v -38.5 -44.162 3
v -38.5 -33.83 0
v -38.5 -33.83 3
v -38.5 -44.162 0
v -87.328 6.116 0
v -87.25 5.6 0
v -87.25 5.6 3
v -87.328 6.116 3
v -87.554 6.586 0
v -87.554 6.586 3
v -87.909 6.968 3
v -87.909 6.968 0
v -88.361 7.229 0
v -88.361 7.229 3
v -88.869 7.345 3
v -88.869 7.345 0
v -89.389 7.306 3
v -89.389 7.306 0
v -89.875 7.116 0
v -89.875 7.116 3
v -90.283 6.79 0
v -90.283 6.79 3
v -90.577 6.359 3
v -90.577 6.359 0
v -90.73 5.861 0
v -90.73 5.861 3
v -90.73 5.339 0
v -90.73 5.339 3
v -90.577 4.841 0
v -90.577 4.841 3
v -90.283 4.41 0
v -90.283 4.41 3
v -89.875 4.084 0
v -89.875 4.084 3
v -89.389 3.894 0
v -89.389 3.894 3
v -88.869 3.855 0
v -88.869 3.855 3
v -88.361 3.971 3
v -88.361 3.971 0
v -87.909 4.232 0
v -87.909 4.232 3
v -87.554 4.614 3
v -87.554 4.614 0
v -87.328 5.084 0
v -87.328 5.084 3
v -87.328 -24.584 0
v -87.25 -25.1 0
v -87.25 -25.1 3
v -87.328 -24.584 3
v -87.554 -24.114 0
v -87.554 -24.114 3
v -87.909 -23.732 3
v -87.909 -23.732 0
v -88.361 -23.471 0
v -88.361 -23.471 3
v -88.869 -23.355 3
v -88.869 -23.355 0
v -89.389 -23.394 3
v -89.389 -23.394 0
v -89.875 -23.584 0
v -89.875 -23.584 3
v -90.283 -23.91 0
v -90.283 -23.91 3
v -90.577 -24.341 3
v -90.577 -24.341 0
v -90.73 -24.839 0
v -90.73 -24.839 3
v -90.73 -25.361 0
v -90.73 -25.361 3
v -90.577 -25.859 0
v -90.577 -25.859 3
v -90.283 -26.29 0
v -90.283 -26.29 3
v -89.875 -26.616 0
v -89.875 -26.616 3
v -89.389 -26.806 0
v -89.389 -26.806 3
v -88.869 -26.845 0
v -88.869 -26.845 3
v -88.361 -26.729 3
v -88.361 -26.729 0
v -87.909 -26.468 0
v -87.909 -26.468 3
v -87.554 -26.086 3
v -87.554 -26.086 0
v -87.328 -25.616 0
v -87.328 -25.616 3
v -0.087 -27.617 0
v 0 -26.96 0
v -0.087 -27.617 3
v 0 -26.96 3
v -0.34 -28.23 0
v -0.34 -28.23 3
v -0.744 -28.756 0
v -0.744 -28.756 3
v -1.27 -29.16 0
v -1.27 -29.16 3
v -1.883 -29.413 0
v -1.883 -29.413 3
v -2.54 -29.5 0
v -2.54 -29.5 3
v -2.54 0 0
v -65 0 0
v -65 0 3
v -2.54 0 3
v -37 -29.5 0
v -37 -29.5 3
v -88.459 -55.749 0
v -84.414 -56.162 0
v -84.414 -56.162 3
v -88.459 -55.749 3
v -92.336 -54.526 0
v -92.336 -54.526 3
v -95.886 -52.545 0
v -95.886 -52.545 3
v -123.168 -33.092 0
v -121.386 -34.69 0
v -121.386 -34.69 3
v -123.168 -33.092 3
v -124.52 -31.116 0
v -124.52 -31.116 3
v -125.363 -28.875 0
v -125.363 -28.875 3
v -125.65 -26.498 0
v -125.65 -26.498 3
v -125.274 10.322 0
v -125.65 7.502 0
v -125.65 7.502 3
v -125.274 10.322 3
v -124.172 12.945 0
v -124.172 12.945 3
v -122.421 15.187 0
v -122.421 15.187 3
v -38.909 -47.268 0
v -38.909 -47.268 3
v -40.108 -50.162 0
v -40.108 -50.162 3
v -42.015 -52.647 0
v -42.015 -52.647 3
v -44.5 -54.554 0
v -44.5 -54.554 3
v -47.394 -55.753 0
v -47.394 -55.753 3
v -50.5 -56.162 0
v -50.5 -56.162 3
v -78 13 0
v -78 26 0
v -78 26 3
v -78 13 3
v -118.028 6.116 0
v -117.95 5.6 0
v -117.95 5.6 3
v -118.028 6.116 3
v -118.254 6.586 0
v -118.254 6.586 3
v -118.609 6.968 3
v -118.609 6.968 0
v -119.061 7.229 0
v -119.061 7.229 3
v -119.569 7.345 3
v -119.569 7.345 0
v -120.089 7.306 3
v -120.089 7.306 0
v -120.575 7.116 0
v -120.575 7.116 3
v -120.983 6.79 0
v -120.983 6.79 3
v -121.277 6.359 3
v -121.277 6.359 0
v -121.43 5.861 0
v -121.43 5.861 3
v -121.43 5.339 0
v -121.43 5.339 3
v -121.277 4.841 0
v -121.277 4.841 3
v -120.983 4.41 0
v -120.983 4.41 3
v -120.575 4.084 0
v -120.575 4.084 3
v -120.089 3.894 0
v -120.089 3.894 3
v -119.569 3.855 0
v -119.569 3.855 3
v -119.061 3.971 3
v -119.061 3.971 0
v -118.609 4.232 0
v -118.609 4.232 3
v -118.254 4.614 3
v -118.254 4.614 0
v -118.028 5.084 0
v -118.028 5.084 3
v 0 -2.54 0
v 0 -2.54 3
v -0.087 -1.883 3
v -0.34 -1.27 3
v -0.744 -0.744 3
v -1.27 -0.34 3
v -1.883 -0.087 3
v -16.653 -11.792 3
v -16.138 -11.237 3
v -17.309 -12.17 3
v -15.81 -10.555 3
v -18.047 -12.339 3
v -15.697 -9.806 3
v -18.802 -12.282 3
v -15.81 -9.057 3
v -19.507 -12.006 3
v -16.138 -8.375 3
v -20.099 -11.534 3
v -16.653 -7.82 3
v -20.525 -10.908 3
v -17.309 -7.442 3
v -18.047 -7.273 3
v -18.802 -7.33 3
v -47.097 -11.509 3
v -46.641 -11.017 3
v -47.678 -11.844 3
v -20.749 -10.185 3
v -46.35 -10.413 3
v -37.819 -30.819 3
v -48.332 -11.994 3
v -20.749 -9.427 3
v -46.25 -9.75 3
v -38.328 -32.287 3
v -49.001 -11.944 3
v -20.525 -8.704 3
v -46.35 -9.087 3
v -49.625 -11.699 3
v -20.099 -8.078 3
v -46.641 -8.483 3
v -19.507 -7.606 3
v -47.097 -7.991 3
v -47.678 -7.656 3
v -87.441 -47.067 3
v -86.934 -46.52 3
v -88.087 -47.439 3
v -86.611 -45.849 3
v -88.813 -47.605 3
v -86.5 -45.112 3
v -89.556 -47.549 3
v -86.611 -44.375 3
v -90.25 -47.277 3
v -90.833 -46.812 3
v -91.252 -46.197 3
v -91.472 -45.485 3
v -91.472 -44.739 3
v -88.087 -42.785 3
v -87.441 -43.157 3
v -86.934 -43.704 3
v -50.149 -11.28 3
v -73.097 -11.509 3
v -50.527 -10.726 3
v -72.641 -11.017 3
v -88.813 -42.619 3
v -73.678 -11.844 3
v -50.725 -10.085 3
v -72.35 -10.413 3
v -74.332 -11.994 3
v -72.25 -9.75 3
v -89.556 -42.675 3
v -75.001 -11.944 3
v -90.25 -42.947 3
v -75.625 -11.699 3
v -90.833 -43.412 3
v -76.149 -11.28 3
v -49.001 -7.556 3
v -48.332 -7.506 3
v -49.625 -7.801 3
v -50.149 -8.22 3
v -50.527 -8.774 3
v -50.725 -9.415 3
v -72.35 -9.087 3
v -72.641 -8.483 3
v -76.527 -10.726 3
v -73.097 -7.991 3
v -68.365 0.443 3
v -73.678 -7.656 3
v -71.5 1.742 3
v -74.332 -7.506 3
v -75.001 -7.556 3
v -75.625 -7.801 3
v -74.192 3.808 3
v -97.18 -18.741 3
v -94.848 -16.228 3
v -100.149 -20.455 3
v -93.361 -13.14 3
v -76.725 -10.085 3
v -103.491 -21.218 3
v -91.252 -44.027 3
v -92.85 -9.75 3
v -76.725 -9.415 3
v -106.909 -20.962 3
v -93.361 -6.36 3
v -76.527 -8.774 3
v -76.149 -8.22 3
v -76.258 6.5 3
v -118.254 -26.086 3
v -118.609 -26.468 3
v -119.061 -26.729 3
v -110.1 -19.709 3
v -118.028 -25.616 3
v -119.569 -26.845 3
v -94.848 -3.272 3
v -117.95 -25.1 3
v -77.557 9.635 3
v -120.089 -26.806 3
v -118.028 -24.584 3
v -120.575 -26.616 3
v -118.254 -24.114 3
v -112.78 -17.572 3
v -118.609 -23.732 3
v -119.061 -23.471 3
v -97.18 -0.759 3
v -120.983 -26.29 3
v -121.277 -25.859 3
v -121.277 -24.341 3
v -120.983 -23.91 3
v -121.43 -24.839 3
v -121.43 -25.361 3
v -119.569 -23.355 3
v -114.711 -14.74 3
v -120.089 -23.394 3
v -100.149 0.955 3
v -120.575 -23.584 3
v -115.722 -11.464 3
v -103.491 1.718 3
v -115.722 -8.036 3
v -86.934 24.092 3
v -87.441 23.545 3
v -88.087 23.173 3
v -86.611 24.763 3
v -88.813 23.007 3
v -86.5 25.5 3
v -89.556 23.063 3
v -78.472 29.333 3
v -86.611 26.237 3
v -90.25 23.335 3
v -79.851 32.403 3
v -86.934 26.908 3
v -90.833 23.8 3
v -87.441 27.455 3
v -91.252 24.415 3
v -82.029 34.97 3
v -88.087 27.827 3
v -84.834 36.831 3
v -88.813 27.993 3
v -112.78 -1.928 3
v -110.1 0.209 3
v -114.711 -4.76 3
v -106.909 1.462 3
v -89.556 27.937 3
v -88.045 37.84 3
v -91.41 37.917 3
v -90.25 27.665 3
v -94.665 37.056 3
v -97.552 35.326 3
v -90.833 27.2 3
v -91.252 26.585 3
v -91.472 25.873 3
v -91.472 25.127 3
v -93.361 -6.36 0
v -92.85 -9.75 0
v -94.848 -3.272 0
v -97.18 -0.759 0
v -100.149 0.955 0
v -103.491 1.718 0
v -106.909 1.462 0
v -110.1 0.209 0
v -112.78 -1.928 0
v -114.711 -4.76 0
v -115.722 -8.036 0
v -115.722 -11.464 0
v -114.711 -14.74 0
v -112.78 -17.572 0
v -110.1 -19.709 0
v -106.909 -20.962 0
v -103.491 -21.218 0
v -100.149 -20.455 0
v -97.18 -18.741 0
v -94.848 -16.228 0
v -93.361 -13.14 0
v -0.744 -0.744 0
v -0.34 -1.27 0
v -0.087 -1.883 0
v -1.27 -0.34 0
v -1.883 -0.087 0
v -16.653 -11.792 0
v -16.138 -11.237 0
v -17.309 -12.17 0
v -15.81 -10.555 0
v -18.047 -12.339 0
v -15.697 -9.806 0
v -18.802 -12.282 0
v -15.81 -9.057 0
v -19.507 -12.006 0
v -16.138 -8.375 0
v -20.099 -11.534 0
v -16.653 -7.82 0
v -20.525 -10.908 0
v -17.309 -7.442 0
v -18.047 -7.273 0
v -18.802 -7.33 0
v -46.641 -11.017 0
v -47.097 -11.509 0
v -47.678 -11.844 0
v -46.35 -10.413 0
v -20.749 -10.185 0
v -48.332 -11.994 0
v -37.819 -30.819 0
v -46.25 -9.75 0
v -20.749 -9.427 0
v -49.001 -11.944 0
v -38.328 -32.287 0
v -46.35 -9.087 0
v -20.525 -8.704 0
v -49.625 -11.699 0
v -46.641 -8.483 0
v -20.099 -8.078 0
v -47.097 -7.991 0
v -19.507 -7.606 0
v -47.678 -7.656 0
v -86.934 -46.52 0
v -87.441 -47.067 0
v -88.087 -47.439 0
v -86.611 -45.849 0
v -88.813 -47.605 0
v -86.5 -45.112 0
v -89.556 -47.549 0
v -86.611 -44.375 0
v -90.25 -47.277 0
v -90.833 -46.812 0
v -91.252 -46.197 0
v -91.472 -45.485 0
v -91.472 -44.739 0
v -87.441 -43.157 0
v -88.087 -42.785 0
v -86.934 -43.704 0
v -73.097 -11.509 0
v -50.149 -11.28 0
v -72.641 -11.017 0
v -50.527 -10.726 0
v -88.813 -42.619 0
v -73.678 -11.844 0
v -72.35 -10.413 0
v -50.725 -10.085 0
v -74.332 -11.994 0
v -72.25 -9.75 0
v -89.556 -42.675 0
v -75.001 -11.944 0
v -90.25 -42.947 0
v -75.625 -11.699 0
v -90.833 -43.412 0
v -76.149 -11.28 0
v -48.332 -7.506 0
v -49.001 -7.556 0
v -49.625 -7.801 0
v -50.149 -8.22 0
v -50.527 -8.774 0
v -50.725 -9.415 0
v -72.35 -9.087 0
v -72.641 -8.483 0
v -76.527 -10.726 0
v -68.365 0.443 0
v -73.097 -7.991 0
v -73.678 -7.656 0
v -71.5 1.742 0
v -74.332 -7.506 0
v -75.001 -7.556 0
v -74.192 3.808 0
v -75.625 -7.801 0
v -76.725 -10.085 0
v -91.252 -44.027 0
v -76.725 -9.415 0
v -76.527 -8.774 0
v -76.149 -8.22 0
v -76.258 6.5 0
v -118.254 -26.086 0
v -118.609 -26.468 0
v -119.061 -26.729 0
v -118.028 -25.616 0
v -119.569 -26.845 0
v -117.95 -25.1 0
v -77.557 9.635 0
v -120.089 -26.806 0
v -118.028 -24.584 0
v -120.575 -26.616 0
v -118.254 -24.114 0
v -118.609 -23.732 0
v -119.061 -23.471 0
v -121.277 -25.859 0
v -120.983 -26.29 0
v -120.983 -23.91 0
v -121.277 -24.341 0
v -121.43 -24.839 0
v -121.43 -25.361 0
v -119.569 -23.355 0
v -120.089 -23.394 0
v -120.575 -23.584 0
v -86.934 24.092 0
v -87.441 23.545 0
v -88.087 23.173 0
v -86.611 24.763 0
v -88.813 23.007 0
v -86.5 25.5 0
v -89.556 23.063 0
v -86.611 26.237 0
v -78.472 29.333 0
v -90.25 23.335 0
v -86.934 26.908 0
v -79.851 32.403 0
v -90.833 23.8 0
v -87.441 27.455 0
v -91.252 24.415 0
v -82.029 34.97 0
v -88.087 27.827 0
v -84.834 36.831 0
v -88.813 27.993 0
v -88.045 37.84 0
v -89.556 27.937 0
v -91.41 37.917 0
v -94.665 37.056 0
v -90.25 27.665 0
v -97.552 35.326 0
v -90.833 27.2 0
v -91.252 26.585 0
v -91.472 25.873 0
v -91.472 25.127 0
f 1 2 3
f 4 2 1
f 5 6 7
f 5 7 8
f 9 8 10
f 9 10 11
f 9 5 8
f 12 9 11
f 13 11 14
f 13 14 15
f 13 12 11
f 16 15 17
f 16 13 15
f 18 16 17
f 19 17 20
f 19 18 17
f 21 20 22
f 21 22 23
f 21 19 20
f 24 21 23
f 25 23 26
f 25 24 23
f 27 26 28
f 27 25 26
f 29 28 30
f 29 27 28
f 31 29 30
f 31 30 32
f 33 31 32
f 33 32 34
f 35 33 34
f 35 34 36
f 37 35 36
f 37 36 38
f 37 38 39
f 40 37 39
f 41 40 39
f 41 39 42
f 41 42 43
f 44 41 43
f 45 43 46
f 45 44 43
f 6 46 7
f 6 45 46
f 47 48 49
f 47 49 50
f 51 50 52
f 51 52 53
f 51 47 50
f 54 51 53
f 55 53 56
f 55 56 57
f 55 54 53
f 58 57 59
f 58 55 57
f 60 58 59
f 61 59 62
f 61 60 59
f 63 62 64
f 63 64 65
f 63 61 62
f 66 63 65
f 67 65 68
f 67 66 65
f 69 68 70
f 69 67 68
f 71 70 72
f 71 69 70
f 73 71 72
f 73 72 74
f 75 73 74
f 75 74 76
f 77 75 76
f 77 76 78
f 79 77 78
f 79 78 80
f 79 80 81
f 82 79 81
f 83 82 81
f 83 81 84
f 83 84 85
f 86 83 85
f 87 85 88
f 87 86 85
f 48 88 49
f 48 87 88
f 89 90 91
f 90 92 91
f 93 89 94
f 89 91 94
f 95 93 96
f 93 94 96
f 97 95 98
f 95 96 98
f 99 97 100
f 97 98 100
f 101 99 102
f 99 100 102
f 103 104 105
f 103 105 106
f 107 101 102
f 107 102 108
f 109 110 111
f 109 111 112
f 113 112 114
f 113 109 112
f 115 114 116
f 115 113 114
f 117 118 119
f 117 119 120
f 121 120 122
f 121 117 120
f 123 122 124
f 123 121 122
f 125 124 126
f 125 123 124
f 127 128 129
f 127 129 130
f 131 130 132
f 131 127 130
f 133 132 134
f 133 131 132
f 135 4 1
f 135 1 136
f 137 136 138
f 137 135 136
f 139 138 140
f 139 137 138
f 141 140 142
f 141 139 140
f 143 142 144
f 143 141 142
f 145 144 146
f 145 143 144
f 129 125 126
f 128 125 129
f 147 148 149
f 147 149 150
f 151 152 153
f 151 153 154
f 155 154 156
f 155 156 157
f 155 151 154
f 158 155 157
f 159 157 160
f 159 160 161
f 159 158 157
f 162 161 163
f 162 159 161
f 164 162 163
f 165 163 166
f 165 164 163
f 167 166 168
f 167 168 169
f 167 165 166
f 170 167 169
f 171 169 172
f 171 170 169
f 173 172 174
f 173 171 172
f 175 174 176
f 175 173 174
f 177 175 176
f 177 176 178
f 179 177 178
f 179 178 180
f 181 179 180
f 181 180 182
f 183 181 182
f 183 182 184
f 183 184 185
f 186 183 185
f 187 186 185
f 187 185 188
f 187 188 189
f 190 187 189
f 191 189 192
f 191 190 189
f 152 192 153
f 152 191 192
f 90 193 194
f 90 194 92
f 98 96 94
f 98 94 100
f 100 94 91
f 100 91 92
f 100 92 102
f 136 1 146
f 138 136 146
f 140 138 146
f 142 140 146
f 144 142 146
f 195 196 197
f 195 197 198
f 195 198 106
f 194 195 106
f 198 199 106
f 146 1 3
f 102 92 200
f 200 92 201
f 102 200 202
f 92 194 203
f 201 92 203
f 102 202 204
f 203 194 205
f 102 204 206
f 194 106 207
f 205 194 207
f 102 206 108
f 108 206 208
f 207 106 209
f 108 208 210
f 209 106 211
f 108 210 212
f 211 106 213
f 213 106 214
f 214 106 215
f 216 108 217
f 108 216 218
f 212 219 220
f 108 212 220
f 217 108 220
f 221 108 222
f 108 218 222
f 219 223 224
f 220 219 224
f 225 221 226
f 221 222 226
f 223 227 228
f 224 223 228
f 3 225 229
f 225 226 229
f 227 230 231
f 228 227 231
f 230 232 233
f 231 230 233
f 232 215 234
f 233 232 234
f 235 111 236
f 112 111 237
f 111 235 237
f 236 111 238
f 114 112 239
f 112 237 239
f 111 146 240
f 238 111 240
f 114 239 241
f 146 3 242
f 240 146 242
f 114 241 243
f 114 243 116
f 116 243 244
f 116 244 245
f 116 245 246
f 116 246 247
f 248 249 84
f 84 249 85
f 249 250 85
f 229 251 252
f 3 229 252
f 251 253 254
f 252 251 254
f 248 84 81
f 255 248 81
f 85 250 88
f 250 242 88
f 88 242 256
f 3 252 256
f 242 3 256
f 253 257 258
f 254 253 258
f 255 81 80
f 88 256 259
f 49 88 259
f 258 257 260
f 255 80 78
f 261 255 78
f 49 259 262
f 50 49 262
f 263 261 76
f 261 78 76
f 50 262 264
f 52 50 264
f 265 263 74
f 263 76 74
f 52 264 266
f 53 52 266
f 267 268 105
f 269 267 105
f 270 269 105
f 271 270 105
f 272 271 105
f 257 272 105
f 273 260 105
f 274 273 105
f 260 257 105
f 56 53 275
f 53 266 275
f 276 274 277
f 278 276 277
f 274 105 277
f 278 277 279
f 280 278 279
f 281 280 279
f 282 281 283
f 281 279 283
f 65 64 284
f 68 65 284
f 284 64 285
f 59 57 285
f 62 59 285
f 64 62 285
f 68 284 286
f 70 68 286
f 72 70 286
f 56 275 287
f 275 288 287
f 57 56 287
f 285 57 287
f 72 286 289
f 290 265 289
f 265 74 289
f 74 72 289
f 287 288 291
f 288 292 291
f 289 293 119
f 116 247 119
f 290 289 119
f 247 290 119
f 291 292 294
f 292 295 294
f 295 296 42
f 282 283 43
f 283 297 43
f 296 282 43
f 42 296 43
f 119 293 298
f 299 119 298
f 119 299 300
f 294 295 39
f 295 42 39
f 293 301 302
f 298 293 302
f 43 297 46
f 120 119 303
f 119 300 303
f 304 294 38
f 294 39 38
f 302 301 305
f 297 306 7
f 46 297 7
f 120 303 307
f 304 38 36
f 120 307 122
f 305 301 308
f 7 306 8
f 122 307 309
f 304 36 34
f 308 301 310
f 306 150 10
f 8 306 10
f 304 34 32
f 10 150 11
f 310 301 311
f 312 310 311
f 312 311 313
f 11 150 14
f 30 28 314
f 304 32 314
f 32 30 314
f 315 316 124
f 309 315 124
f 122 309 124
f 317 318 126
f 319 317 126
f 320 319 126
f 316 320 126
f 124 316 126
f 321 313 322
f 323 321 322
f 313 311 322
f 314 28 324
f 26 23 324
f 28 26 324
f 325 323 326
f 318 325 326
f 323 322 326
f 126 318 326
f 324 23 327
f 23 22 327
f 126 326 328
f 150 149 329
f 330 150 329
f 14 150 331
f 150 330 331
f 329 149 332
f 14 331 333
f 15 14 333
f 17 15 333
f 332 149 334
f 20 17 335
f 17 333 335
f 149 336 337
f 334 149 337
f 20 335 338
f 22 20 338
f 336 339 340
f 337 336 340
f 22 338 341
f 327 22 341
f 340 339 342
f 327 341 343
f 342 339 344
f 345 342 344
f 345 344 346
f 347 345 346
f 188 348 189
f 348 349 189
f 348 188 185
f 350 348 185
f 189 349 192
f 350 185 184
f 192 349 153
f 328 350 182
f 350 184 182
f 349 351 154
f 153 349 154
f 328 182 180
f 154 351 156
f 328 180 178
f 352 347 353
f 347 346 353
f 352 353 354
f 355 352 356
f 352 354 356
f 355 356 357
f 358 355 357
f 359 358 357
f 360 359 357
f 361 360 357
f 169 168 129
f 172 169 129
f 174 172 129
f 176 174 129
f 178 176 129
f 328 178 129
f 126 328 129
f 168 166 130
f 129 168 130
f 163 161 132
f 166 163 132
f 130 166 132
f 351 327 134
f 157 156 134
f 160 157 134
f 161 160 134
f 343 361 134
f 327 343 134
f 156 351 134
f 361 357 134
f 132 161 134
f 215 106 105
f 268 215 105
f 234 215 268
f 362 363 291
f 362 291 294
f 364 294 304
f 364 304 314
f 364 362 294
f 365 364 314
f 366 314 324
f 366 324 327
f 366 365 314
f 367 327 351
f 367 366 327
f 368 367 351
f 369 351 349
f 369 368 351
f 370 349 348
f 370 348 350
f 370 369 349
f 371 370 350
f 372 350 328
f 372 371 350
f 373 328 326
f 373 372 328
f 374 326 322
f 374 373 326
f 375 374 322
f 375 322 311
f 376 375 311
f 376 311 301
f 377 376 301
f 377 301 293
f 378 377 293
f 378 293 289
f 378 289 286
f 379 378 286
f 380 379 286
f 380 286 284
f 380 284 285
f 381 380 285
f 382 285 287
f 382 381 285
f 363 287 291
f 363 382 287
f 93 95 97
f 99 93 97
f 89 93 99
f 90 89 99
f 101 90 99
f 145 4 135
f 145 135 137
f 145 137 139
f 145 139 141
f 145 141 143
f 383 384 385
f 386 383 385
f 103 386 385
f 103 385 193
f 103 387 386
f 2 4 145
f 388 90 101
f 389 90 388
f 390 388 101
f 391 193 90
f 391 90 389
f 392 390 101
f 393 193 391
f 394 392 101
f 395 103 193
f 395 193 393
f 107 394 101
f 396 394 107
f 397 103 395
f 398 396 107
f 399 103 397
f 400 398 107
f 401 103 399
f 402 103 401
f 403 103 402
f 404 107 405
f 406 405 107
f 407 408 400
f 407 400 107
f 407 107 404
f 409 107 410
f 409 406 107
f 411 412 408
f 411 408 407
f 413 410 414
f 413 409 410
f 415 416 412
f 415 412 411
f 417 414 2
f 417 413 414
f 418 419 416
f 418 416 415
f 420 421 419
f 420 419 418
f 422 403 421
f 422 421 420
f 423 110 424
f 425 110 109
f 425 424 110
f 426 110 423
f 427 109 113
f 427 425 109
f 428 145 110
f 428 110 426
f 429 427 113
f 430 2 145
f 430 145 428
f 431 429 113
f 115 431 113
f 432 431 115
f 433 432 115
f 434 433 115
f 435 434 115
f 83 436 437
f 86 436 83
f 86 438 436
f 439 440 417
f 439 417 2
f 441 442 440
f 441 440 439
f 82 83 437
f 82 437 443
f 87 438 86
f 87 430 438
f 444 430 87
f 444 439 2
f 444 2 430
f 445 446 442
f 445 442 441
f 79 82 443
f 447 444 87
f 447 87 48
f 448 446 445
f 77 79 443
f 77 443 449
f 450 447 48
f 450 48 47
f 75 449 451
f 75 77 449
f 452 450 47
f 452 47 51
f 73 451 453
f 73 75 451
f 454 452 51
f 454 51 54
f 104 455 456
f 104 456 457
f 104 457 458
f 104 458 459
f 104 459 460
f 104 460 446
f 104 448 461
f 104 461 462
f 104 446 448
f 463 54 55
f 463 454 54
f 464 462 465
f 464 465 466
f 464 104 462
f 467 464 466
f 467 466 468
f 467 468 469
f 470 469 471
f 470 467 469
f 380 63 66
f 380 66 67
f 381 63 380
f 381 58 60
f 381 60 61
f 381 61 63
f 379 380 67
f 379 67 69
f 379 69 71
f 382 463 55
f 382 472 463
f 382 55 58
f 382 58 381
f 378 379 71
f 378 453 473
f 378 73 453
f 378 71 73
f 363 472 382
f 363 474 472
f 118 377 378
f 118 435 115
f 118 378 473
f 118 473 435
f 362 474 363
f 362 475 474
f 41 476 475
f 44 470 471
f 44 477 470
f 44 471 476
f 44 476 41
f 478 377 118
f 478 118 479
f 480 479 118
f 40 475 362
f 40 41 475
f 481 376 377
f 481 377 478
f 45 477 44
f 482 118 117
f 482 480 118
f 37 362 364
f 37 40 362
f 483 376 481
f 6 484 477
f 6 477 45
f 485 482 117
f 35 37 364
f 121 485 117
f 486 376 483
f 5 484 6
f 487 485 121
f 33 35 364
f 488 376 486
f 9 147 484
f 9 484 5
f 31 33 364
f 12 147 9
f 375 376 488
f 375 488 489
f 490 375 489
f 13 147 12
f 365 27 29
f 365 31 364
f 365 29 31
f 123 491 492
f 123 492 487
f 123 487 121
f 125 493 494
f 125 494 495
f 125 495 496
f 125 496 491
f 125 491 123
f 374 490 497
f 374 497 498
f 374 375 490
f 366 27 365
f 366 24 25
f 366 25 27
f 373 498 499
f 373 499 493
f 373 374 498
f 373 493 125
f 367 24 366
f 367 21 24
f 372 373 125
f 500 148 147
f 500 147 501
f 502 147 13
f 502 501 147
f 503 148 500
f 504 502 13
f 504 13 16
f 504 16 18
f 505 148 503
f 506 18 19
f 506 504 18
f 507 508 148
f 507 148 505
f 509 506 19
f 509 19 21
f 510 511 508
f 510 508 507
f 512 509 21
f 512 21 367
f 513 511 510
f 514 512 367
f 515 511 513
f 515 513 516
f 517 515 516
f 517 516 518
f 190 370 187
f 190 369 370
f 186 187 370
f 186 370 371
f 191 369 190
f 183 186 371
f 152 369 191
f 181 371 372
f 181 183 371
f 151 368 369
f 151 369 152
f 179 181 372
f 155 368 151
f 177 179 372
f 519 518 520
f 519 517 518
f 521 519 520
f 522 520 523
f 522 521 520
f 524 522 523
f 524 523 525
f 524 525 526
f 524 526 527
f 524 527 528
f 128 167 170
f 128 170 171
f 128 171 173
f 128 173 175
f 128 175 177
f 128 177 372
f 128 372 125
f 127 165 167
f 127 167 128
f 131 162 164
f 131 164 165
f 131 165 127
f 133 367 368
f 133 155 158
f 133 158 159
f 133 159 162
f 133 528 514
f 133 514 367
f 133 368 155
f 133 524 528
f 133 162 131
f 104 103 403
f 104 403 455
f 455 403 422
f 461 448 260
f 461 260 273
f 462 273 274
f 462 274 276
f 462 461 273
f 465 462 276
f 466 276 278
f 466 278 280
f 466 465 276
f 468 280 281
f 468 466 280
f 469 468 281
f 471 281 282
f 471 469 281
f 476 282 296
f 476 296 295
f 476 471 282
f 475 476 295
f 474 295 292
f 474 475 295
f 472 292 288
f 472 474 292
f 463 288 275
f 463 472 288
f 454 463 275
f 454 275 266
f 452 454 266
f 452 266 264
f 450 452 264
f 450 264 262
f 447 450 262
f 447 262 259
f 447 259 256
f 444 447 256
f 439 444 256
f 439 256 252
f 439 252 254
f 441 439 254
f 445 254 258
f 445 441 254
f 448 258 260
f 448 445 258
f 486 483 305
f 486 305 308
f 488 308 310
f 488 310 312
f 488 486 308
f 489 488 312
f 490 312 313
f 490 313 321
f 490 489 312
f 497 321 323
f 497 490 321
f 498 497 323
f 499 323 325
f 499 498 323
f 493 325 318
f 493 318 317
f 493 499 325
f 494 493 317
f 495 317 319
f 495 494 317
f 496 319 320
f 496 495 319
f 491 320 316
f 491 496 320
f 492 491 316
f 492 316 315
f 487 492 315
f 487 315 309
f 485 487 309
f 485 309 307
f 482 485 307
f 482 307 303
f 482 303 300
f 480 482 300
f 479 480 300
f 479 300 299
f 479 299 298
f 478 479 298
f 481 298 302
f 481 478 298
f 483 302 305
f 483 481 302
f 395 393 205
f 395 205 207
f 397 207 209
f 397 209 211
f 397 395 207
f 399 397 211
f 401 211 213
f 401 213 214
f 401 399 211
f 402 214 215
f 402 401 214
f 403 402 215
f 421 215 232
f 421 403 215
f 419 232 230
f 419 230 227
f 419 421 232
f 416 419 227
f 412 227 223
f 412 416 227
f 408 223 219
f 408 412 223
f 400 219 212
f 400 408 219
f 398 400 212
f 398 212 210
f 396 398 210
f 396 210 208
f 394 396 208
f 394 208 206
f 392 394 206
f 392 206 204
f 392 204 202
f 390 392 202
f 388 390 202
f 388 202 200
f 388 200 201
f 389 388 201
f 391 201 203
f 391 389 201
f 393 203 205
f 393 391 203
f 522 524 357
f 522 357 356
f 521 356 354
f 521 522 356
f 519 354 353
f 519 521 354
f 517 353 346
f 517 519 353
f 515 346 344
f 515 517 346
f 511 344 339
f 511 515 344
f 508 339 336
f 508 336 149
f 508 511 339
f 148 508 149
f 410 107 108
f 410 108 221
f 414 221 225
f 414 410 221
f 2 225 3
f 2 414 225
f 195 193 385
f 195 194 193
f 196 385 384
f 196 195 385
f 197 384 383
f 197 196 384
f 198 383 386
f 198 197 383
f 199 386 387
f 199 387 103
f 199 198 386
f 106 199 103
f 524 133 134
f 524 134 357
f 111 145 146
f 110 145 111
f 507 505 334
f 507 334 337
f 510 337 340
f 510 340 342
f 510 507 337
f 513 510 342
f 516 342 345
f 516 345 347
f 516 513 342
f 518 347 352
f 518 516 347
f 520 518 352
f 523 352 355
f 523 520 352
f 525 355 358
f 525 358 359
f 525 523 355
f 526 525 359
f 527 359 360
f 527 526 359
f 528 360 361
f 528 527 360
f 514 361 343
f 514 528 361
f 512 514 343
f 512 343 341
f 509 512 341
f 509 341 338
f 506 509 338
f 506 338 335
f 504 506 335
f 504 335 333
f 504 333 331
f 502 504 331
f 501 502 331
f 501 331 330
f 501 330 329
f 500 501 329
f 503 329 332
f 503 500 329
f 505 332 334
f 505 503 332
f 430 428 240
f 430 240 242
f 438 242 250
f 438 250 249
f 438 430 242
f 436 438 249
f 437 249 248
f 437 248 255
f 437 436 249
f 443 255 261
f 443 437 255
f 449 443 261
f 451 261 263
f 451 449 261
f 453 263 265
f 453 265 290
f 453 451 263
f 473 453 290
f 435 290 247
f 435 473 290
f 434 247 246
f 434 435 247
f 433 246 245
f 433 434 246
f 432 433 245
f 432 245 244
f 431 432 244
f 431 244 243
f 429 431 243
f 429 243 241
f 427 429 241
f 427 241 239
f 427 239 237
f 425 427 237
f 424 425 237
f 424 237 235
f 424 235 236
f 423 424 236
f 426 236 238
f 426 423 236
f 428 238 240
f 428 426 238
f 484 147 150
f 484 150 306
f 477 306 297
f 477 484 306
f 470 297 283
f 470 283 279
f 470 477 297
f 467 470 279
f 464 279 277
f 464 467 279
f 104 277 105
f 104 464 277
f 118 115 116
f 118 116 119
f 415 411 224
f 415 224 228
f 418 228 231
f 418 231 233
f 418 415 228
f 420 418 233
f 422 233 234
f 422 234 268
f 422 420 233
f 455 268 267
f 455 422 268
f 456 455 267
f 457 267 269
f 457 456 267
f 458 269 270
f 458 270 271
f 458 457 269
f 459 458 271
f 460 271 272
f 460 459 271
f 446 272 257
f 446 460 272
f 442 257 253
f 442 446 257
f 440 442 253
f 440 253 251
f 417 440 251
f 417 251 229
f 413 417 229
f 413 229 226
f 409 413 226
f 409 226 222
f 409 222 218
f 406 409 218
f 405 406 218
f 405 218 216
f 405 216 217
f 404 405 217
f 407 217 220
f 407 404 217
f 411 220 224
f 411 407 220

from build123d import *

# Parameters (mm, degrees)
SKETCH1_R           = 2.54
SKETCH1_R_2         = 2.25
SKETCH1_R_3         = 1.75
SKETCH1_R_4         = 2.5
SKETCH1_R_5         = 11.5
BOSS_EXTRUDE1_DEPTH = 3
FILLET2_R           = 2.54


with BuildPart() as part:
    # Sketch1 → Boss-Extrude1 (new body)
    with BuildSketch(Plane.XY):
        with BuildLine():
            Line((0, 0), (0, -29.5))
            Line((0, -29.5), (-37, -29.5))
            ThreePointArc((-37, -29.5), (-38.114378278, -31.538839171), (-38.5, -33.830127019))
            Line((-38.5, -33.830127019), (-38.5, -44.16209895))
            ThreePointArc((-38.5, -44.16209895), (-42.014718626, -52.647380324), (-50.5, -56.16209895))
            Line((-50.5, -56.16209895), (-84.414235636, -56.16209895))
            ThreePointArc((-84.414235636, -56.16209895), (-90.428351627, -55.236437965), (-95.885764364, -52.545139836))
            Line((-95.885764364, -52.545139836), (-121.385764364, -34.689847611))
            ThreePointArc((-121.385764364, -34.689847611), (-124.520108332, -31.115813301), (-125.65, -26.498327168))
            Line((-125.65, -26.498327168), (-125.65, 7.501672832))
            ThreePointArc((-125.65, 7.501672832), (-124.809828805, 11.670050653), (-122.420515459, 15.187499024))
            Line((-122.420515459, 15.187499024), (-97.551844693, 35.325751537))
            ThreePointArc((-97.551844693, 35.325751537), (-84.833866838, 36.831023412), (-78, 26))
            Line((-78, 26), (-78, 13))
            ThreePointArc((-78, 13), (-74.192388155, 3.807611845), (-65, 0))
            Line((-65, 0), (0, 0))
        make_face()
        with Locations((-18.237, -9.806)):
            Circle(SKETCH1_R, mode=Mode.SUBTRACT)
        with Locations((-48.5, -9.75)):
            Circle(SKETCH1_R_2, mode=Mode.SUBTRACT)
        with Locations((-74.5, -9.75)):
            Circle(SKETCH1_R_2, mode=Mode.SUBTRACT)
        with Locations((-89, 5.6)):
            Circle(SKETCH1_R_3, mode=Mode.SUBTRACT)
        with Locations((-89, 25.5)):
            Circle(SKETCH1_R_4, mode=Mode.SUBTRACT)
        with Locations((-89, -25.1)):
            Circle(SKETCH1_R_3, mode=Mode.SUBTRACT)
        with Locations((-89, -45.112)):
            Circle(SKETCH1_R_4, mode=Mode.SUBTRACT)
        with Locations((-104.35, -9.75)):
            Circle(SKETCH1_R_5, mode=Mode.SUBTRACT)
        with Locations((-119.7, 5.6)):
            Circle(SKETCH1_R_3, mode=Mode.SUBTRACT)
        with Locations((-119.7, -25.1)):
            Circle(SKETCH1_R_3, mode=Mode.SUBTRACT)
    extrude(amount=BOSS_EXTRUDE1_DEPTH)

    # Fillet2
    fillet2_edges = [part.edges().sort_by_distance(p)[0] for p in [
        (0, 0, 1.5),
        (0, -29.5, 1.5),
    ]]
    fillet(fillet2_edges, radius=FILLET2_R)


solid = part.part
